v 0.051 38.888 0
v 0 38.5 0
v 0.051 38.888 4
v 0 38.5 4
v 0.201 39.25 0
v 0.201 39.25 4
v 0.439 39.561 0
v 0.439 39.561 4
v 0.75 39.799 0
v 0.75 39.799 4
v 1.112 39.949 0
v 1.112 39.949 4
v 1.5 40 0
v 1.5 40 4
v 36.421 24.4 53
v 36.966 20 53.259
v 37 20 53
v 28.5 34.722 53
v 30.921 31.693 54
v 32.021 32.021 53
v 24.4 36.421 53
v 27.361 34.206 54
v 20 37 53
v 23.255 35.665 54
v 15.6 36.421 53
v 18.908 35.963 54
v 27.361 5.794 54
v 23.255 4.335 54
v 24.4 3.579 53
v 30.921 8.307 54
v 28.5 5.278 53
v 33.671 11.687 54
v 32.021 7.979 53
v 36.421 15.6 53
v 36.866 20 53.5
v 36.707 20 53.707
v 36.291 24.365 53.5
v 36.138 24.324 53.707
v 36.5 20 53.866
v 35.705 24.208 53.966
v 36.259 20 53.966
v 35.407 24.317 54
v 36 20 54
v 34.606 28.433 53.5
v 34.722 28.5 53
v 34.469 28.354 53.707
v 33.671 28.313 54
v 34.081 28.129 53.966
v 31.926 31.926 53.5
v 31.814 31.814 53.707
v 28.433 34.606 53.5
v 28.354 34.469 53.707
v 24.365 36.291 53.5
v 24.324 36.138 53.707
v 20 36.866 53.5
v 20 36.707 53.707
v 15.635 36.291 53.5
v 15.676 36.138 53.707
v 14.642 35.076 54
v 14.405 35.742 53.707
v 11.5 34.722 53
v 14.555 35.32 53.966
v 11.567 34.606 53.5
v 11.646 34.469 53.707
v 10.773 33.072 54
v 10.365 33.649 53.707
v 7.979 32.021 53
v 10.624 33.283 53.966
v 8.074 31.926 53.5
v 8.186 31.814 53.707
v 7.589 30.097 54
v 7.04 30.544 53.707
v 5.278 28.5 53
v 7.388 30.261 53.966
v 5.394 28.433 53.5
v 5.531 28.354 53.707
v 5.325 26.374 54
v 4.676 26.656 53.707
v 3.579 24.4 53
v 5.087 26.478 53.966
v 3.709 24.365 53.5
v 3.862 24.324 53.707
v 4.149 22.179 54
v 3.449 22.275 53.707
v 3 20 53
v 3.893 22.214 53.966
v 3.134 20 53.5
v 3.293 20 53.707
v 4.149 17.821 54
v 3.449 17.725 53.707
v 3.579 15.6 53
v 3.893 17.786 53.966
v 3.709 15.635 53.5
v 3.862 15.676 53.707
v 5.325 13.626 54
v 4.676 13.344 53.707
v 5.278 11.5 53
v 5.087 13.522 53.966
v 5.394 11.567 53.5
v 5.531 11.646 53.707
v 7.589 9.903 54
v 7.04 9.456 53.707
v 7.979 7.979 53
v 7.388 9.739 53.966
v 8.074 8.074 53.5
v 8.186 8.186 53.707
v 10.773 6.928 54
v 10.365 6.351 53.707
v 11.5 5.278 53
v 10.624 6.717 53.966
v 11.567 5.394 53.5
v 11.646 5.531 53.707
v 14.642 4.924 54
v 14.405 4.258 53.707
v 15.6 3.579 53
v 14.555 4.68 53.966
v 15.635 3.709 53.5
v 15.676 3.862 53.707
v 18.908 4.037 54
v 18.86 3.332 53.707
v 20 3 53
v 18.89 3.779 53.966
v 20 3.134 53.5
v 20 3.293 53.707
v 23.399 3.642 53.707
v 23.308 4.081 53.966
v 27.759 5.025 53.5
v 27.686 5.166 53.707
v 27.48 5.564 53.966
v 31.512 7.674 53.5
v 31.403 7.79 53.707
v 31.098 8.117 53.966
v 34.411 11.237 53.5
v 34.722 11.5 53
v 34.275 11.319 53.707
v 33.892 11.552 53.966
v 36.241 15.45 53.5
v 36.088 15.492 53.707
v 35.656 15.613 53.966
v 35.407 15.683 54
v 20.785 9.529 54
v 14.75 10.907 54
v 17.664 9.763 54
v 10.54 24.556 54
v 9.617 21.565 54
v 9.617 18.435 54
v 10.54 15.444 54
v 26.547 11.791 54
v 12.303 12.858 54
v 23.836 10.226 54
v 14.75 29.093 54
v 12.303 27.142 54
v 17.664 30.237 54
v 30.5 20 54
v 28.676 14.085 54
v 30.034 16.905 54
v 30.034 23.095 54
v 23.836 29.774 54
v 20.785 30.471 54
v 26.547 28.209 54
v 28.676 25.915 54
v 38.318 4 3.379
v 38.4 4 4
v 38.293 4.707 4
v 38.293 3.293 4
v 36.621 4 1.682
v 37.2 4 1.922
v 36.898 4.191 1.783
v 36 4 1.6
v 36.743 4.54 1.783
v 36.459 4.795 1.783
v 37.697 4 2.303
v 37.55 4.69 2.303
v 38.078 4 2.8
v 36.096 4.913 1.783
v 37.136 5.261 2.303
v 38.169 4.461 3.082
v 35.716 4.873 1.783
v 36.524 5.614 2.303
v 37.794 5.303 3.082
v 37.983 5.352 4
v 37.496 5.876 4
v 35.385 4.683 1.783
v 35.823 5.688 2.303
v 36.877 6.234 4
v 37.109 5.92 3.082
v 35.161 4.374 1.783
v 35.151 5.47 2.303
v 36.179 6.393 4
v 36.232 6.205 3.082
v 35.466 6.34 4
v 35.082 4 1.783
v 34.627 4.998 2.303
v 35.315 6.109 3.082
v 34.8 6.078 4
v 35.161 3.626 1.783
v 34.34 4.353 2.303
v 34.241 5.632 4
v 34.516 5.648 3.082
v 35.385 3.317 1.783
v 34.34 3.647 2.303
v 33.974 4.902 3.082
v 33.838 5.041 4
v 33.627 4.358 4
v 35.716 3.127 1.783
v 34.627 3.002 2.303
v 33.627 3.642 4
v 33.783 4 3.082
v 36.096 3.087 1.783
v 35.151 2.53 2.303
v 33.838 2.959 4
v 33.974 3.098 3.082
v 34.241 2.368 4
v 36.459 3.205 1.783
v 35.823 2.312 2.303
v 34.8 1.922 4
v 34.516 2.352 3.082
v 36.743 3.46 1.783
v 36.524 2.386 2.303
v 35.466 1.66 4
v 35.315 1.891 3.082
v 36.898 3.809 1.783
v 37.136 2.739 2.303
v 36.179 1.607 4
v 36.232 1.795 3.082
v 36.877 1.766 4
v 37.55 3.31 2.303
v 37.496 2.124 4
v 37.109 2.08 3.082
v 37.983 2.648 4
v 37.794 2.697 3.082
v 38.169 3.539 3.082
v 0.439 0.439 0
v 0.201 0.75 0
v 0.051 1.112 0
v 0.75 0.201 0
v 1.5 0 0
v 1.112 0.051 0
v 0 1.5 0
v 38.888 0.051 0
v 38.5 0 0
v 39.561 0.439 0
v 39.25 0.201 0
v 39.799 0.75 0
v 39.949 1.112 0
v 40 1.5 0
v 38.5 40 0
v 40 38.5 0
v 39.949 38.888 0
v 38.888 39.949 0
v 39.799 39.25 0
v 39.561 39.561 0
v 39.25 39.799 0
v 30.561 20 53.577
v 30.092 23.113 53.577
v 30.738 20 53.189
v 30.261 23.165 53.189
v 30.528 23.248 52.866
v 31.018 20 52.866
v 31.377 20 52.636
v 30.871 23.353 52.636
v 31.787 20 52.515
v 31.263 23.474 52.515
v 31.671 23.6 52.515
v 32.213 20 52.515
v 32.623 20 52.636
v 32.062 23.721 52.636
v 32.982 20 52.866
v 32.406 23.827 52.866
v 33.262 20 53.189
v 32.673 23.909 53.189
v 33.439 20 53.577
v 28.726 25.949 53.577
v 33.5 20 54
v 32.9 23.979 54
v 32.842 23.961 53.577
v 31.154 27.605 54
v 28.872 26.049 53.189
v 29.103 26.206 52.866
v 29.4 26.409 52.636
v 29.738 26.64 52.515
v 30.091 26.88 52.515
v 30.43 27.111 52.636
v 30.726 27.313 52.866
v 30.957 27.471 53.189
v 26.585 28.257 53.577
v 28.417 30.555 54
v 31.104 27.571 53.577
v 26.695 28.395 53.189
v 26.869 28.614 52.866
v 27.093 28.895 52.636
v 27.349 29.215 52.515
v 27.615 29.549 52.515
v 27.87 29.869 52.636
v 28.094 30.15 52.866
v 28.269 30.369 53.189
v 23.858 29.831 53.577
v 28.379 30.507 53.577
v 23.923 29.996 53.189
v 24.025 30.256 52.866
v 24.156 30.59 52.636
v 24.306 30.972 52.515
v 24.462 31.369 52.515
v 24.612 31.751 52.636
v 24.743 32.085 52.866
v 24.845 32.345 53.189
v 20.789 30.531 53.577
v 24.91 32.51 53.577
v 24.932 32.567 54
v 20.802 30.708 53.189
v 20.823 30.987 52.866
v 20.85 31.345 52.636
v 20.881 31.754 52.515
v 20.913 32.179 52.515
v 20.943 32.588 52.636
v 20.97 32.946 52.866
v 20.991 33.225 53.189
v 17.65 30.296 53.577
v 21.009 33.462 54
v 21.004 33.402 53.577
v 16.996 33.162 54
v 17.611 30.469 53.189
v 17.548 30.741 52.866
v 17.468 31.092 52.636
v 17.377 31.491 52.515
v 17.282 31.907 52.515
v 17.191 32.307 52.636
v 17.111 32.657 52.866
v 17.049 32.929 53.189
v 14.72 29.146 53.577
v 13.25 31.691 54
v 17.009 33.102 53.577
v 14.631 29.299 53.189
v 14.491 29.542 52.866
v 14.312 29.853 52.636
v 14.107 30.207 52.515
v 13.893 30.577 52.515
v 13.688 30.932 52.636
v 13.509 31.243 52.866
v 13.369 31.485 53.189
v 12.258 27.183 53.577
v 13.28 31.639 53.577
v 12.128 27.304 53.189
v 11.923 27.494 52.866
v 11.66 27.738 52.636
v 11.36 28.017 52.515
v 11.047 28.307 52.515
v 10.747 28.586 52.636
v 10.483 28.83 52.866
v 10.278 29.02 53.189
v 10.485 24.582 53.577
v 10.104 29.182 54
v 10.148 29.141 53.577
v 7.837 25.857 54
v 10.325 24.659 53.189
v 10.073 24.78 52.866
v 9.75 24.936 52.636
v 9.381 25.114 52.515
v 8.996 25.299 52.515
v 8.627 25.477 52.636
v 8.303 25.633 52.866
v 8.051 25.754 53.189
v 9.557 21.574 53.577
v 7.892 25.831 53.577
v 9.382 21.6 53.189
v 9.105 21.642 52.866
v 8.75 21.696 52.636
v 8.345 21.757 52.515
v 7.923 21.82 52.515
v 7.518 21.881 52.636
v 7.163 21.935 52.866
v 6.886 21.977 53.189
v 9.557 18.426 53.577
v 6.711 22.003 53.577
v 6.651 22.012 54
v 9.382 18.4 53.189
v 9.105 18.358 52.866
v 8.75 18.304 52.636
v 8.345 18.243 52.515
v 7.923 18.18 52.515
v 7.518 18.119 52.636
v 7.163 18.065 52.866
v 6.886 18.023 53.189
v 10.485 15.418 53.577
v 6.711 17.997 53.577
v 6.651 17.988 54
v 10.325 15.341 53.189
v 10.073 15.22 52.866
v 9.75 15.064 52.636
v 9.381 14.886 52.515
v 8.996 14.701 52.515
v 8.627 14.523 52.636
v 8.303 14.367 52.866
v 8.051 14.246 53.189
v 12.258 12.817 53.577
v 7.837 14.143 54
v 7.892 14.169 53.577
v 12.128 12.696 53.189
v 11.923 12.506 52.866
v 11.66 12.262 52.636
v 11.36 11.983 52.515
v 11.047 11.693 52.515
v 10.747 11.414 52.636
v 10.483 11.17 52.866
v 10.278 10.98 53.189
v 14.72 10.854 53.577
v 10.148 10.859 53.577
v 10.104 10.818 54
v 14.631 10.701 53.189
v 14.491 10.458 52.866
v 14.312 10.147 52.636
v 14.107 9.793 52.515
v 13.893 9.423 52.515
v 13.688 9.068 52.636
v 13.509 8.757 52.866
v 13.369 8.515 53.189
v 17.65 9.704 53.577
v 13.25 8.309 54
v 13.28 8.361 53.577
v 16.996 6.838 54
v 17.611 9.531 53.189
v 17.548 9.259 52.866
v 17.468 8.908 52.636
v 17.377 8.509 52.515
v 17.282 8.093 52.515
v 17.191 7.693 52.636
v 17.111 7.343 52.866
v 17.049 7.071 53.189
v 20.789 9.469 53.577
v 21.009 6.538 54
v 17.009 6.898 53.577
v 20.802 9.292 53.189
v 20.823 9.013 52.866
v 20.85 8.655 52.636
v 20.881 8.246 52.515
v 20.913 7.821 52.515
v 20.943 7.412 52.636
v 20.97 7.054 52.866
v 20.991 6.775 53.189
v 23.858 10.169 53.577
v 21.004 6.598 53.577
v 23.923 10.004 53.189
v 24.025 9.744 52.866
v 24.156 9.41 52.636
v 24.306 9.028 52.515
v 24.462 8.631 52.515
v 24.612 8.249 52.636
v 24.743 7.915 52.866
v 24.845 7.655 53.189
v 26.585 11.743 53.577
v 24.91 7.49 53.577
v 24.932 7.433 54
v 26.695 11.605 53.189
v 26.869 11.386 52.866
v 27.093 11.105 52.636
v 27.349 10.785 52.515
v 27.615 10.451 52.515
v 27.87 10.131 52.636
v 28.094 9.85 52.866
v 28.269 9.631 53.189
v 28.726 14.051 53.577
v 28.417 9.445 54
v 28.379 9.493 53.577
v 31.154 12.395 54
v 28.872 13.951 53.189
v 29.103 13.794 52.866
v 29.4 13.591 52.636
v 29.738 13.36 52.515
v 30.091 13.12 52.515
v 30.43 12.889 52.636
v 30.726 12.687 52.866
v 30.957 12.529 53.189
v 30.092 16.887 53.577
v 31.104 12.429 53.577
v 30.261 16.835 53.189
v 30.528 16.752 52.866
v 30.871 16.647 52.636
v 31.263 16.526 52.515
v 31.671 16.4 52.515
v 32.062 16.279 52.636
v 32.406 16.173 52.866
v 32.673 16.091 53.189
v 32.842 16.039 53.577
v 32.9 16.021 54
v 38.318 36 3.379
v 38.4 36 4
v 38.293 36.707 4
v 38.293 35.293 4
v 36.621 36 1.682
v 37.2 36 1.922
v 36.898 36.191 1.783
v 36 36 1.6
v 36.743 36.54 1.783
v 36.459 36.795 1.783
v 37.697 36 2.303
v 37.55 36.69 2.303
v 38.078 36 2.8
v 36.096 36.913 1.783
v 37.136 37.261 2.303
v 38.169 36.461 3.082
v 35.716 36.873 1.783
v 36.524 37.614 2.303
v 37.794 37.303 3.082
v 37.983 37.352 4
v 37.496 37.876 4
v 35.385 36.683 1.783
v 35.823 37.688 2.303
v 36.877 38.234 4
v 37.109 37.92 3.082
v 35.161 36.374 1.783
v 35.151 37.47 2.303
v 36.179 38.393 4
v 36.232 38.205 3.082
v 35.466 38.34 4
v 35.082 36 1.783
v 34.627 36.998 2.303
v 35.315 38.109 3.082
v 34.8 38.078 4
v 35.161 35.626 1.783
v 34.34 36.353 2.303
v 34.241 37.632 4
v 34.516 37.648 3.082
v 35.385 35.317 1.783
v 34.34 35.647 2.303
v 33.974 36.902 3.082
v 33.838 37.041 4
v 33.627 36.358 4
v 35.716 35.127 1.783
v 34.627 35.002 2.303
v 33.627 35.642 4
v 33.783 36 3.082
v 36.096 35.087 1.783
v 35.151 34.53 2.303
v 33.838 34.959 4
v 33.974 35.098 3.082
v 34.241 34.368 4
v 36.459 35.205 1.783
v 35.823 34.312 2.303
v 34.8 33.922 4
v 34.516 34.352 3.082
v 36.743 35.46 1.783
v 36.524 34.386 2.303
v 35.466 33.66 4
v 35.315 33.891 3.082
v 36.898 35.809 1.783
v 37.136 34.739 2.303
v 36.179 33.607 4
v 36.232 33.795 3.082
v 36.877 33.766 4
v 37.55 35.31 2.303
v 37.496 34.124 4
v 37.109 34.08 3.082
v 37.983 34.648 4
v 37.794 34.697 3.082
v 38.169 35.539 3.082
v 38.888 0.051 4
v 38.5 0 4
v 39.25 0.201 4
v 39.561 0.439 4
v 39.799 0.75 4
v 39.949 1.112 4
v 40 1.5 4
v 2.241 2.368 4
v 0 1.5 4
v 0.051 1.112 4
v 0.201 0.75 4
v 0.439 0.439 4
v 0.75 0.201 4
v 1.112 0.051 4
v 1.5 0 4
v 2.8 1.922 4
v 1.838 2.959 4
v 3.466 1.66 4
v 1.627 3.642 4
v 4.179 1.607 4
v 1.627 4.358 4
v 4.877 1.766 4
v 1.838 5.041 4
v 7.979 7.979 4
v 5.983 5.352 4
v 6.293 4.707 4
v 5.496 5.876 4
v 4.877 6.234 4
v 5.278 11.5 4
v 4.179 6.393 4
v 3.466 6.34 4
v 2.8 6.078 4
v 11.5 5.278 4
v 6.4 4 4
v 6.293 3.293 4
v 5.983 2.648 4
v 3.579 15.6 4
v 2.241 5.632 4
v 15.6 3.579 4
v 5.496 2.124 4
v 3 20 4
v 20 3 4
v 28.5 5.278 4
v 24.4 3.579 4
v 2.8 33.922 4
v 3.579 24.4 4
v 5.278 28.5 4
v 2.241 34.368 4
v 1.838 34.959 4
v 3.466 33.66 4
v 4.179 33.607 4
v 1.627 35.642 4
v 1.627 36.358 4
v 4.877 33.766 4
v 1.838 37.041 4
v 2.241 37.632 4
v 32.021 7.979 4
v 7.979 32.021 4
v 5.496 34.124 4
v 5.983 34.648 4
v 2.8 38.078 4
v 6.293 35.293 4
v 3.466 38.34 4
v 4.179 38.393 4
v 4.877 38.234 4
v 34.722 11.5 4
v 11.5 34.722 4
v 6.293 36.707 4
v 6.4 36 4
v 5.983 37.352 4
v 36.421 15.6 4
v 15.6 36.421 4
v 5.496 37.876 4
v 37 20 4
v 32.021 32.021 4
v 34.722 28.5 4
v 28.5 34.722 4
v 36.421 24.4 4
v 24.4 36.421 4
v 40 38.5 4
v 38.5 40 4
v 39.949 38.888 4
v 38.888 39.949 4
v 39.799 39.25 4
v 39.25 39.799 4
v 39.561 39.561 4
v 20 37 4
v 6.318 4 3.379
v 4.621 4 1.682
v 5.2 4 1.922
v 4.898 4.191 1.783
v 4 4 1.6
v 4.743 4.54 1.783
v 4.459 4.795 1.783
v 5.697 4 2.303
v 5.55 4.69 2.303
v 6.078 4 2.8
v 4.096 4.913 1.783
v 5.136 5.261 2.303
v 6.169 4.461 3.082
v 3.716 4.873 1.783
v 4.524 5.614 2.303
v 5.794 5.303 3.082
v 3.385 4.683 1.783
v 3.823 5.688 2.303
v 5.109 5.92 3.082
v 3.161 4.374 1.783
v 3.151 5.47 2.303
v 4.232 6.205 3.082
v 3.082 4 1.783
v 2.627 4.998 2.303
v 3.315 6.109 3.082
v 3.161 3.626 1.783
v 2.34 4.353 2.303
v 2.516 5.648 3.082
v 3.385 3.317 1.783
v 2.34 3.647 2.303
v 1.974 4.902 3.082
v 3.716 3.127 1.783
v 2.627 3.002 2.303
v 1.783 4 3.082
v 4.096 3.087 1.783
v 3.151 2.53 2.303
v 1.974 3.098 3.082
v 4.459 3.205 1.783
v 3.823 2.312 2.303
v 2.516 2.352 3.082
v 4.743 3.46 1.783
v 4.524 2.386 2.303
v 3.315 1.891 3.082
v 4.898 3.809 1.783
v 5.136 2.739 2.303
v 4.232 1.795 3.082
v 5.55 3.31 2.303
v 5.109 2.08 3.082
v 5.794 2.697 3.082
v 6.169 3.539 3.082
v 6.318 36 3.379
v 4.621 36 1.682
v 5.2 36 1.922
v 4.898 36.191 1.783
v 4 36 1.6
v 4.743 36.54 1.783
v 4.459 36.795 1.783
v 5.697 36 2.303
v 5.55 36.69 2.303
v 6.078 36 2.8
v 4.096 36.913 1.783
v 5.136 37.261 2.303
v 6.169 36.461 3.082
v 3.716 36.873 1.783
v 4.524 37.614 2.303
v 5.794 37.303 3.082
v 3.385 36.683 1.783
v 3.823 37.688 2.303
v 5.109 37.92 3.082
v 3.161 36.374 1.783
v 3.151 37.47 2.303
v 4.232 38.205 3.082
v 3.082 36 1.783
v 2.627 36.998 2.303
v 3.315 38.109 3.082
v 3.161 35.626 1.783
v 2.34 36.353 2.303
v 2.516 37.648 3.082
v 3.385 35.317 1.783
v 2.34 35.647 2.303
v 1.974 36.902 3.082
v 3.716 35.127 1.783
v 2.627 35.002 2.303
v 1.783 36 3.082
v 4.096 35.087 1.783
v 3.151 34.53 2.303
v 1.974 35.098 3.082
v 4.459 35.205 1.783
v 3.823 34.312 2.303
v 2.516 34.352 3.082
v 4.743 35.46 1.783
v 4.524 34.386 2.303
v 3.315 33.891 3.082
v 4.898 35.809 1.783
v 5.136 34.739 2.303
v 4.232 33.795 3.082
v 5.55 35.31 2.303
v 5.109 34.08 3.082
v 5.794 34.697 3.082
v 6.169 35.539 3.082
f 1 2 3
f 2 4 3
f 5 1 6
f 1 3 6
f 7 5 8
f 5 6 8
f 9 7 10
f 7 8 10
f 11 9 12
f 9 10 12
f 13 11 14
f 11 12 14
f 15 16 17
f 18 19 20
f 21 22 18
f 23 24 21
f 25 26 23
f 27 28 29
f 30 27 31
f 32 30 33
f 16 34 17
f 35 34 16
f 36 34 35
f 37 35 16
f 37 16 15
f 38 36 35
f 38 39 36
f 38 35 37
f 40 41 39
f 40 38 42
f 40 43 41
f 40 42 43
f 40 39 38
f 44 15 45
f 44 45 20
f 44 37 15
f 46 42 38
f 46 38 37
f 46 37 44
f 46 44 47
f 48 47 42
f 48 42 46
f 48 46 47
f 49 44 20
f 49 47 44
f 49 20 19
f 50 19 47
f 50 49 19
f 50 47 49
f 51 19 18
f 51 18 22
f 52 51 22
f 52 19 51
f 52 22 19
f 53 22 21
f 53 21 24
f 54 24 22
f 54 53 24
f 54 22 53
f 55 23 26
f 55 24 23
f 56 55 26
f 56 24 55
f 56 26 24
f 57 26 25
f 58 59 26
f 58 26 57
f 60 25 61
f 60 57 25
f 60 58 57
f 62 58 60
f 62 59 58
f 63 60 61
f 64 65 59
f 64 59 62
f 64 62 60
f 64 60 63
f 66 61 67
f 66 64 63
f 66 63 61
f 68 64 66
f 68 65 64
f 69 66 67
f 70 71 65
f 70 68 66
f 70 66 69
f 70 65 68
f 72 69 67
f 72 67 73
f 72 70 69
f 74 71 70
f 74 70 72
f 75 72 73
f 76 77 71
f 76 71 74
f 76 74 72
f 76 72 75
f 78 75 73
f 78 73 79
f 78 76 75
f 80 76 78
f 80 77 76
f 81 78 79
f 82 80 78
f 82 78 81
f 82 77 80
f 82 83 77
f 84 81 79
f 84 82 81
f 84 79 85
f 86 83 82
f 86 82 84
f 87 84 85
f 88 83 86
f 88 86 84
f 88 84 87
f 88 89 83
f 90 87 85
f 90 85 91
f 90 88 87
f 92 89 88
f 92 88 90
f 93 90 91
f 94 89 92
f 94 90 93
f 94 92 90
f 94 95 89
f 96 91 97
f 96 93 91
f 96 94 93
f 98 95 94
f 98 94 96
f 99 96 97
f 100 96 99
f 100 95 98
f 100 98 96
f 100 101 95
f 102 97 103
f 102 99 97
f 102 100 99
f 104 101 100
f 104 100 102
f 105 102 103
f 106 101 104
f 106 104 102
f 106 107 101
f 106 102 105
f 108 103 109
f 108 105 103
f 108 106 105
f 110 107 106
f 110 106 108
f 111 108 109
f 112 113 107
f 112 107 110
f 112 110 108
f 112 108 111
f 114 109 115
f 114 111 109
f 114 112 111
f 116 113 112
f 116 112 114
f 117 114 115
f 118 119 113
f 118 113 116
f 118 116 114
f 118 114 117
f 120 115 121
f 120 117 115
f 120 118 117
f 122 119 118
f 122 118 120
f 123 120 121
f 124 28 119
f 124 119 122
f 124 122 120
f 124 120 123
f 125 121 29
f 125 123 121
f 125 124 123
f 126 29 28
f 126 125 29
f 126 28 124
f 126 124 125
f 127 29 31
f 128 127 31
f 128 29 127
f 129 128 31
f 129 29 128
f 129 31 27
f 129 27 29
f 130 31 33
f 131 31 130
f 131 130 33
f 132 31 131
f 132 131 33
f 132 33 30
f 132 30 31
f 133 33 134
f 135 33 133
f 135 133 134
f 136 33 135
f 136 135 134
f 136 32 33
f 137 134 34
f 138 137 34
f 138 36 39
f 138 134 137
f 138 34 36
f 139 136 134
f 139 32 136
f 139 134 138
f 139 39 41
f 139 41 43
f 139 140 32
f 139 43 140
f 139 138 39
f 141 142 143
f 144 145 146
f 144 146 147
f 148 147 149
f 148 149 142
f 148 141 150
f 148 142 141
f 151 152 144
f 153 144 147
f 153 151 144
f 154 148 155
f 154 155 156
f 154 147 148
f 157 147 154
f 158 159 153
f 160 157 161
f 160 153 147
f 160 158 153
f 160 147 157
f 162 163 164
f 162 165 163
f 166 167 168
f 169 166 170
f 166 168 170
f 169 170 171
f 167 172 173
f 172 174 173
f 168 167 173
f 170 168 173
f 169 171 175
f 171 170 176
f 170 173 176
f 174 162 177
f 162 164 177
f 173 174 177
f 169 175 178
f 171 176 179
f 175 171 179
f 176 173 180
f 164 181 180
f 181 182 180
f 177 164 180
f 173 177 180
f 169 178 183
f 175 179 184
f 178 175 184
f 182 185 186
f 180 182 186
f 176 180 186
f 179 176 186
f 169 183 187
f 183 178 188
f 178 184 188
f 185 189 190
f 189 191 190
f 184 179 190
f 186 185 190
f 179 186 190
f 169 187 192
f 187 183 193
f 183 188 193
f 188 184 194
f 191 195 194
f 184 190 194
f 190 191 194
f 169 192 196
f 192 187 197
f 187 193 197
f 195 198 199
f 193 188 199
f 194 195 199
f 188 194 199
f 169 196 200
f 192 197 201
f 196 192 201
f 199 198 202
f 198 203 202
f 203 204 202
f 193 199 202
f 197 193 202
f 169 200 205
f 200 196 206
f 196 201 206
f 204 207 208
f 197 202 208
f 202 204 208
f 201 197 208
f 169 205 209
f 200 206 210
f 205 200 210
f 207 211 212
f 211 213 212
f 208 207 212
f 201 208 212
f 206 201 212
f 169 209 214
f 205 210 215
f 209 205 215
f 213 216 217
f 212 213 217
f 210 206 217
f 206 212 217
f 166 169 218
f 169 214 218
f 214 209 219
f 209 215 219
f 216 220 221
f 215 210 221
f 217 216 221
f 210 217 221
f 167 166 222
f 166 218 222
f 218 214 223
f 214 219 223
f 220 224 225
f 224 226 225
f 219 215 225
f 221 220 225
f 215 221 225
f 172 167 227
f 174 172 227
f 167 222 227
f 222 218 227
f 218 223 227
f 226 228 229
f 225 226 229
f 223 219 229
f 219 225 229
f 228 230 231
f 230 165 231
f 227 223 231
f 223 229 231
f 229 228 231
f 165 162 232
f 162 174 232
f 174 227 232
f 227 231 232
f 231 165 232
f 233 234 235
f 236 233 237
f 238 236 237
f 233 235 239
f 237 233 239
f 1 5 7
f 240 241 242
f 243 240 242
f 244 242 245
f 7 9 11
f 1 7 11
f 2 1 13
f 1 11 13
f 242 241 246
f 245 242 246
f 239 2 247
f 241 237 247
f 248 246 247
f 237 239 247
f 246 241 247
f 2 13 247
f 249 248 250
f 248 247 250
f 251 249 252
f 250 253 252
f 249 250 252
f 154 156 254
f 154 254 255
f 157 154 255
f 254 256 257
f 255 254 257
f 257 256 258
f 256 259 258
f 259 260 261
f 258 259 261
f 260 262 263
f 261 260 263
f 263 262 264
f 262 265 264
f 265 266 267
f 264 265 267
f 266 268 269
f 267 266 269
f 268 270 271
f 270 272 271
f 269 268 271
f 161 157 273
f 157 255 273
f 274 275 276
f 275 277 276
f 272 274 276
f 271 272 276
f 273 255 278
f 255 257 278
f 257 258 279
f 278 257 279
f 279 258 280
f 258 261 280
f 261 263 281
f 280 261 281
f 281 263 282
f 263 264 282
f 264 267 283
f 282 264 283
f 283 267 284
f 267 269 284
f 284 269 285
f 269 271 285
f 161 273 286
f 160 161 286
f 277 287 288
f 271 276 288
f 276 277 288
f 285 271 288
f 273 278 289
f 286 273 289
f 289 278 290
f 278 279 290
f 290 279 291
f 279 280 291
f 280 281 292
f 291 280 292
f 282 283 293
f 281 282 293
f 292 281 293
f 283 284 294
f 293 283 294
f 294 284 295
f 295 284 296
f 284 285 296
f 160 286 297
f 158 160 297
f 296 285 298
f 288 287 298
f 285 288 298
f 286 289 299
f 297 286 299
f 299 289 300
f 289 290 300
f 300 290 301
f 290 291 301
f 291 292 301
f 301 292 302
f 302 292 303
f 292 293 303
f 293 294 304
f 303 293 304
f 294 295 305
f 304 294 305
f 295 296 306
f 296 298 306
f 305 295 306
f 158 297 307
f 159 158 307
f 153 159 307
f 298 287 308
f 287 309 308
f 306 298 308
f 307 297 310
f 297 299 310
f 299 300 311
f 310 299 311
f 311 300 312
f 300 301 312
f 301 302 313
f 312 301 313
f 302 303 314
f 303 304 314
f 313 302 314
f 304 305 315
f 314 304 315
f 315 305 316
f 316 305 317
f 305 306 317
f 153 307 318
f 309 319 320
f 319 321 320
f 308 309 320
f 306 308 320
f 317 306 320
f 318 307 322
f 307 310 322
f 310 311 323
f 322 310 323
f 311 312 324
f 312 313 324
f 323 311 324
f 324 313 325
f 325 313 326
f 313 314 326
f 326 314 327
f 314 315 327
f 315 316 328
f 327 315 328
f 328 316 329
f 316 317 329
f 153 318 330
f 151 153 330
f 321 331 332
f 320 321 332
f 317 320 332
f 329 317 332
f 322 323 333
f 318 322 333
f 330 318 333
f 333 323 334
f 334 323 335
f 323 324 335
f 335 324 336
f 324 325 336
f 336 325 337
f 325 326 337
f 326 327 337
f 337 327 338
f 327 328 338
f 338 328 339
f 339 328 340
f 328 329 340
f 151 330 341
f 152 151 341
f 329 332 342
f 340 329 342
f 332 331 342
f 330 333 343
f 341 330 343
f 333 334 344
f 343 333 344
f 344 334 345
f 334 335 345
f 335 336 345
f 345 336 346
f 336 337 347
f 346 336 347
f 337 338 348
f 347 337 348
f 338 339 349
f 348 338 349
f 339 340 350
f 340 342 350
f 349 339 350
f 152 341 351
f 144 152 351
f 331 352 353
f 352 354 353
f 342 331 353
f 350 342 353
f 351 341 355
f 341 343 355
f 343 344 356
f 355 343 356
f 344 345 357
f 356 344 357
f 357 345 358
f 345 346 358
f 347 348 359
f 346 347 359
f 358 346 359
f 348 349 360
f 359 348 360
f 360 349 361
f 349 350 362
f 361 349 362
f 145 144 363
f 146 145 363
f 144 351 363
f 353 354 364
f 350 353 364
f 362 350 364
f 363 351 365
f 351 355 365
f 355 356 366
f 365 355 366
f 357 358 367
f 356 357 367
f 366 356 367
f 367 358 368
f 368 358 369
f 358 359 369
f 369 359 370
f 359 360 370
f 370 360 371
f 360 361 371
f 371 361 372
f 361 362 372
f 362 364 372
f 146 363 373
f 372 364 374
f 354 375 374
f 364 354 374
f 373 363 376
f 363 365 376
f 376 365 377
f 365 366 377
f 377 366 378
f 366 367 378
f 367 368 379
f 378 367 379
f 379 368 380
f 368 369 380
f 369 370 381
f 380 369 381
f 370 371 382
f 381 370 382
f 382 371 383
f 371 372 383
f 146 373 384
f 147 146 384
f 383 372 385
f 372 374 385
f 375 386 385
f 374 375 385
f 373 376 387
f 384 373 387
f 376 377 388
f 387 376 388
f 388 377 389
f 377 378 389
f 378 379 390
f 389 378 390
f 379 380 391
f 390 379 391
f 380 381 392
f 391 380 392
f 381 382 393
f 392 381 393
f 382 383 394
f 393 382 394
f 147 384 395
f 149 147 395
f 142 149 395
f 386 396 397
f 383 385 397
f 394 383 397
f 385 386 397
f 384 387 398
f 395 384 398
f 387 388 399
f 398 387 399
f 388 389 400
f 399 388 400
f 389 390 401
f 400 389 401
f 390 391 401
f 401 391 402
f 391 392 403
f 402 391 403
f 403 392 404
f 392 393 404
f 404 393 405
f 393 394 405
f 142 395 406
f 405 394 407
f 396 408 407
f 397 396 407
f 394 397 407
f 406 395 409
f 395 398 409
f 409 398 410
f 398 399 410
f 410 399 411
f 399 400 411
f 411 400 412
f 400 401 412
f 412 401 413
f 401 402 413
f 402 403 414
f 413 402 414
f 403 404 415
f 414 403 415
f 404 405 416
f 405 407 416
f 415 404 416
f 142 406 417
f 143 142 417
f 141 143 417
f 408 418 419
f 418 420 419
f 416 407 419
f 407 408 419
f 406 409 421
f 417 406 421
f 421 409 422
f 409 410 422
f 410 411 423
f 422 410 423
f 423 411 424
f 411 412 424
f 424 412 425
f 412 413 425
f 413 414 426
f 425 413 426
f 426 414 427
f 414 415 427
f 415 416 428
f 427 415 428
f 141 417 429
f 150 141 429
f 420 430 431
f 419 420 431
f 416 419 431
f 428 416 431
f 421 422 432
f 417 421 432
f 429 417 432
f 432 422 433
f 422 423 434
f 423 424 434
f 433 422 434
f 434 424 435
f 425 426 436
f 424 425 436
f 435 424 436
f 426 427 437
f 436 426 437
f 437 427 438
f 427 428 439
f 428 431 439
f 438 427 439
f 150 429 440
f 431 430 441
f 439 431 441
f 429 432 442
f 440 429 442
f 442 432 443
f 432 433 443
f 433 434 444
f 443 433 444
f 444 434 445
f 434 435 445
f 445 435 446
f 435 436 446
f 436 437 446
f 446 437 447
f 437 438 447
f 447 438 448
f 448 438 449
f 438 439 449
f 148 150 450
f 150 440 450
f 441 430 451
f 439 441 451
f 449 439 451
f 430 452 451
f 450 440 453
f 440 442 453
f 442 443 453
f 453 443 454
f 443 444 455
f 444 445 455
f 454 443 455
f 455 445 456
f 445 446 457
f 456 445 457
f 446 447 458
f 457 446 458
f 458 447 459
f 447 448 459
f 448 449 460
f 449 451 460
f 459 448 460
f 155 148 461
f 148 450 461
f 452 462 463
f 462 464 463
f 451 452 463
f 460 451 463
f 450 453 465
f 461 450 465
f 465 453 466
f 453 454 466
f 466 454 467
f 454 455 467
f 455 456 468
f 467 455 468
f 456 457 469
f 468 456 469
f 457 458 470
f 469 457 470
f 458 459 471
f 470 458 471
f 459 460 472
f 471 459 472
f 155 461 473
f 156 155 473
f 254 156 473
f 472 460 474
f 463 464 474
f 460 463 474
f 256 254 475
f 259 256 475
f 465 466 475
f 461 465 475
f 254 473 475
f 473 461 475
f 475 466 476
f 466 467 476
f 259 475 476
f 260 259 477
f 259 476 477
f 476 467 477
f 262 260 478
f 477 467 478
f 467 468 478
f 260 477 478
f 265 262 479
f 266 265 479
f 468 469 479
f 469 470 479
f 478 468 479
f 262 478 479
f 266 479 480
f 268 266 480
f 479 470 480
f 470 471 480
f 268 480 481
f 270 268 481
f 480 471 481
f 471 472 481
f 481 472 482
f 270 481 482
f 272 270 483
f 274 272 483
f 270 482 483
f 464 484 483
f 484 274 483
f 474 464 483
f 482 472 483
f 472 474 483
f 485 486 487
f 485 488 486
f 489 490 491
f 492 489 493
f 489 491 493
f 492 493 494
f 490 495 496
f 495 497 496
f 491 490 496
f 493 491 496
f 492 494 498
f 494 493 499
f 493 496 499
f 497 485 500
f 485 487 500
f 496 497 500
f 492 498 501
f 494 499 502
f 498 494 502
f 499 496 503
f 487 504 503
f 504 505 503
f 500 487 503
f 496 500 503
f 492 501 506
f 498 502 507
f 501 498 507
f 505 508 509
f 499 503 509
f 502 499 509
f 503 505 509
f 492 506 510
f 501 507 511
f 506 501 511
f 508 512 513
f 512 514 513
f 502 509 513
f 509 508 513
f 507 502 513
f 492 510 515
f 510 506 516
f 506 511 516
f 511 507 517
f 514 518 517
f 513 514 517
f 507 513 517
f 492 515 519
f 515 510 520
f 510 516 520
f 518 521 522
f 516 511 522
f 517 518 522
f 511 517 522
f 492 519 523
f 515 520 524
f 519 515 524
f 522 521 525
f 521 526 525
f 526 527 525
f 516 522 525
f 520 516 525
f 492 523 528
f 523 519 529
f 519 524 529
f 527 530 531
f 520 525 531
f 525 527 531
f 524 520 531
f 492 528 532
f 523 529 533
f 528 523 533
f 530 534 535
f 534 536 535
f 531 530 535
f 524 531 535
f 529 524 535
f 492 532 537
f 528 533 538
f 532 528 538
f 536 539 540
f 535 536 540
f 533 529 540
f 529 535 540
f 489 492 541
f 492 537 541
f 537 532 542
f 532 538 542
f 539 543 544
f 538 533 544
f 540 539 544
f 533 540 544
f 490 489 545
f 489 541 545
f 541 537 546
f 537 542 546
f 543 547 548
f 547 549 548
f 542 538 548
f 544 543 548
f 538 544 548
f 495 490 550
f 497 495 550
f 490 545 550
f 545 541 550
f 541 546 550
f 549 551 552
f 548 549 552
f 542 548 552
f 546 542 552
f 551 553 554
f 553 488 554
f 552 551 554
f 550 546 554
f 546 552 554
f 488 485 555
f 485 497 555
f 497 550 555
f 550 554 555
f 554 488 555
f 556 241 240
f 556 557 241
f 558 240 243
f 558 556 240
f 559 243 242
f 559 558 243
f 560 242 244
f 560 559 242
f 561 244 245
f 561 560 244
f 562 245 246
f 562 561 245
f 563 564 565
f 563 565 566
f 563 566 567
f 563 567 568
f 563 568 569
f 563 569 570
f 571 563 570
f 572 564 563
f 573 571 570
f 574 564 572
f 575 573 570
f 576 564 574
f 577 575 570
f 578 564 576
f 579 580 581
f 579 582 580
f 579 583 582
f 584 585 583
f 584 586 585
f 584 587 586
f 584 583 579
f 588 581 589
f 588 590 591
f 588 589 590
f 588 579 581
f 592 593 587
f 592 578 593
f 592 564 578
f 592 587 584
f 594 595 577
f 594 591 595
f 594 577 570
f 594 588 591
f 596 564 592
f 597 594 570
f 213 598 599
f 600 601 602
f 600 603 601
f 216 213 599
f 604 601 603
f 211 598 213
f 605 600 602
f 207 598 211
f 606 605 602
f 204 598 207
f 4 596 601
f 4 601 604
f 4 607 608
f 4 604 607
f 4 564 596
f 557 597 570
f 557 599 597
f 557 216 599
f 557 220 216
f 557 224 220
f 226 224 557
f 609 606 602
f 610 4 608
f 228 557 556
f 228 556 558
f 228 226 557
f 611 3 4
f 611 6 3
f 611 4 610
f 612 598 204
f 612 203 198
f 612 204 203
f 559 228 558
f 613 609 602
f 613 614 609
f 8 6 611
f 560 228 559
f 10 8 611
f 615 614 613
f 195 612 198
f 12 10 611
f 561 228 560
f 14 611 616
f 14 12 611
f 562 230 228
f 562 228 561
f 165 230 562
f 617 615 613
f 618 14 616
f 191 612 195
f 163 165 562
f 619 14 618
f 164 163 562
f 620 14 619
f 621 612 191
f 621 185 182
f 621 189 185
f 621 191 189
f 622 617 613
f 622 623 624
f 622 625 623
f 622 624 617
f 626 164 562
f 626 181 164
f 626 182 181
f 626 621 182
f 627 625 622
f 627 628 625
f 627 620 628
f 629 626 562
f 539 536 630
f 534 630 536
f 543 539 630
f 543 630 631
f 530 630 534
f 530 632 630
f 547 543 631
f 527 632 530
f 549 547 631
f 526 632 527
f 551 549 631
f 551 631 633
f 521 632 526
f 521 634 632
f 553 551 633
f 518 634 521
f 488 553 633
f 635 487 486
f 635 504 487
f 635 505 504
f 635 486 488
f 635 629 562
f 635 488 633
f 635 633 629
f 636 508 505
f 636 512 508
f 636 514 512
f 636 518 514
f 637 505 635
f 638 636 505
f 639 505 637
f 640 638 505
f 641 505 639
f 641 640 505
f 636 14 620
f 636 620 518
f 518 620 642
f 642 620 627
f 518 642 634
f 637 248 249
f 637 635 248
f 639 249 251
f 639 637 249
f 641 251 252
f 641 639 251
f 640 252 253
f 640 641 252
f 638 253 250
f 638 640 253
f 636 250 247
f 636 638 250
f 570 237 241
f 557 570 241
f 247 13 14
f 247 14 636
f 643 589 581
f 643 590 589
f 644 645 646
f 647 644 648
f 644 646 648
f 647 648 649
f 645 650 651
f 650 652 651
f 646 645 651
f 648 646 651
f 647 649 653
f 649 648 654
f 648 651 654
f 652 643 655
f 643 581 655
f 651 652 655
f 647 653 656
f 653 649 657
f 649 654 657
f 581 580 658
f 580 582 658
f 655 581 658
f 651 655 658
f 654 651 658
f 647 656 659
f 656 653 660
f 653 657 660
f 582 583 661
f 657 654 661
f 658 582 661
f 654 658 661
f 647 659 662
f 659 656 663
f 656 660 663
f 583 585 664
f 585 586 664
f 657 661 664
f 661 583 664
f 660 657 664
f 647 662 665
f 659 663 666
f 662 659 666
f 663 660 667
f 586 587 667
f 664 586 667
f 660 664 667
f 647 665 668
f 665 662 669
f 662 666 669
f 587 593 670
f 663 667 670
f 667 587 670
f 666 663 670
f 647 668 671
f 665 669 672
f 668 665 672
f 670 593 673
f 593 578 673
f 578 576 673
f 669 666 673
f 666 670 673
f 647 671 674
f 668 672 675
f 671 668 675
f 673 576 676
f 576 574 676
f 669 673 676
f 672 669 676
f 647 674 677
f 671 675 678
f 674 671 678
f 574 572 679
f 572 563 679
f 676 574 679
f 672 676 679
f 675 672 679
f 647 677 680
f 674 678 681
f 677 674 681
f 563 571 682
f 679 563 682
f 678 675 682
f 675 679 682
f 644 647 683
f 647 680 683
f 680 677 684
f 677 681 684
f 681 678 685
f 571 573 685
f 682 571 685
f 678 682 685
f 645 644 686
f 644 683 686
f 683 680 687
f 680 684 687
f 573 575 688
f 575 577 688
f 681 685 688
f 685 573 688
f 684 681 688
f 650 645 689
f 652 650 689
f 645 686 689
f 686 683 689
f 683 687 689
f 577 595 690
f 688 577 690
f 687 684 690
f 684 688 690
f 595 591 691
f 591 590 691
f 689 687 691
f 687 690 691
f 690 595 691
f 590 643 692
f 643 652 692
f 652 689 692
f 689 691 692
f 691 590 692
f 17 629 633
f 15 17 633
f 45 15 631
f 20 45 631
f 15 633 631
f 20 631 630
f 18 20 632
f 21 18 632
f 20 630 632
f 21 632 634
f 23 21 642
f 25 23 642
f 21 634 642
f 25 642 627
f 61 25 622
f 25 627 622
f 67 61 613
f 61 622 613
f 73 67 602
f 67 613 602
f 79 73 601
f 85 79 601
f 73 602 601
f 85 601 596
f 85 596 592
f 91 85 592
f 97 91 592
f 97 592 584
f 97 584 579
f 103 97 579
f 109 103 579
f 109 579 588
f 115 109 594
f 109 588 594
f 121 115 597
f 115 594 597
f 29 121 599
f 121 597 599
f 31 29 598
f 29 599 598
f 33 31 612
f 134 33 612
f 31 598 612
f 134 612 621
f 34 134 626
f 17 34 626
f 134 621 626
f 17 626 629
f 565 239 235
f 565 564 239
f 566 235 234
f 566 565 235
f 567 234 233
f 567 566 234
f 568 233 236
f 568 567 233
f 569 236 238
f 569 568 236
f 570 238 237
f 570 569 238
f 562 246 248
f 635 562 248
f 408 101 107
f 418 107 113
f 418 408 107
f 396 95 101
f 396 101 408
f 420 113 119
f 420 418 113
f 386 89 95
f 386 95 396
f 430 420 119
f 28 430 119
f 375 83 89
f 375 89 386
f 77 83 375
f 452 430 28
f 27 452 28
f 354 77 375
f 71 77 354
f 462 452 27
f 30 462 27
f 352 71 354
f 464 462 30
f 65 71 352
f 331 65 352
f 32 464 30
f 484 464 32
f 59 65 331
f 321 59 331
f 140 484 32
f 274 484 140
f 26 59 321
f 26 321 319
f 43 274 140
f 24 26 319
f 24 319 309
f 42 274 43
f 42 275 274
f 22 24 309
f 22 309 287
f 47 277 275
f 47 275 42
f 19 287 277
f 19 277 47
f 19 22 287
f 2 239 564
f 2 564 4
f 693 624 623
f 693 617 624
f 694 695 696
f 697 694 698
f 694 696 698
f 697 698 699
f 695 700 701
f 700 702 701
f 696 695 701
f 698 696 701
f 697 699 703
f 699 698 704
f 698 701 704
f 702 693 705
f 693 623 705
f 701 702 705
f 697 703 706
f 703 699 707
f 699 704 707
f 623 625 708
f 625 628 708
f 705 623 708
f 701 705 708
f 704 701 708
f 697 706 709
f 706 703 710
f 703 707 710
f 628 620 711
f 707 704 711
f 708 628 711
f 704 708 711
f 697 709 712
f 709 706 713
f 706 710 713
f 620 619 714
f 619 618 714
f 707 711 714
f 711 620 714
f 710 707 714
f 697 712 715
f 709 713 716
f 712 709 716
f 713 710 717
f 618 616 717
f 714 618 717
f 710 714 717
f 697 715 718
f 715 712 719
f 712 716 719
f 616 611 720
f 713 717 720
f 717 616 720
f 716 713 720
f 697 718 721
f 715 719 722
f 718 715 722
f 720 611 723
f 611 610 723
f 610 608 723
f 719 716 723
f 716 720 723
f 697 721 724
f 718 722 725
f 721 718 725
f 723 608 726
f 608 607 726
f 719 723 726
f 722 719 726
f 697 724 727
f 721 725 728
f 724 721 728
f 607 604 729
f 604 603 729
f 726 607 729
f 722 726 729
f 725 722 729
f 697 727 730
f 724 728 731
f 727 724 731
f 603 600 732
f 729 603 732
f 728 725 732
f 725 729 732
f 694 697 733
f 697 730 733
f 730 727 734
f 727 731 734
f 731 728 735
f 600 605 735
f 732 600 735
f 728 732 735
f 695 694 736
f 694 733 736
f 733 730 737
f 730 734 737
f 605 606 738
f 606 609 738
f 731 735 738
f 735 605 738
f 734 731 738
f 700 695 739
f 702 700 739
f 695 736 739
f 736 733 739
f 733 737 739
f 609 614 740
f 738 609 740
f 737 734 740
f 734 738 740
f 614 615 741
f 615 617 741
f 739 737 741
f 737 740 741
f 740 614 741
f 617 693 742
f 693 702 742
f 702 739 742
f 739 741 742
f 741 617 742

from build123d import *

# Parameters (mm, degrees)
TORUS_R        = 1.5
CYLINDER_R     = 17
CYLINDER_DEPTH = 50
FILLET001_R    = 1
ARRAY_X_COUNT  = 2
ARRAY_X_PITCH  = 32
ARRAY_Y_COUNT  = 2
ARRAY_Y_PITCH  = 32
BOX_W          = 40
BOX_H          = 40
BOX_DEPTH      = 4
FILLET_R       = 1.5


with BuildPart() as part_cilindre:
    # Torus → Torus (revolve)
    with BuildSketch(Plane(origin=(0, 0, 50), x_dir=(1, 0, 0), z_dir=(0, -1, 0))):
        with Locations((12, 0)):
            Circle(TORUS_R)
    revolve(axis=Axis((0, 0, 50), (0, 0, 1)))


with BuildPart() as cilindre_acabat:
    # Cylinder → Cylinder (new body)
    with BuildSketch(Plane.XY):
        Circle(CYLINDER_R)
    extrude(amount=CYLINDER_DEPTH)

    # Fillet001
    fillet001_edges = [cilindre_acabat.edges().sort_by_distance(p)[0] for p in [
        (-17, 0, 50),
    ]]
    fillet(fillet001_edges, radius=FILLET001_R)

    # Cut001: cut part_cilindre
    add(part_cilindre.part, mode=Mode.SUBTRACT)


with BuildPart() as cilindre_acabat_1:
    # Cut001 placement: moved
    add(cilindre_acabat.part.moved(Location((20, 20, 4))))


with BuildPart() as array:
    # Sphere → Sphere (revolve)
    with BuildSketch(Plane(origin=(4, 4, 4), x_dir=(1, 0, 0), z_dir=(0, -1, 0))):
        with BuildLine():
            ThreePointArc((0, -2.4), (2.4, 0), (0, 2.4))
            Line((0, 2.4), (0, -2.4))
        make_face()
    revolve(axis=Axis((4, 4, 4), (0, 0, 1)))

    # Array X: Array ×2


with BuildPart() as array_1:
    add(array.part)
    with Locations(*[(i * ARRAY_X_PITCH, 0, 0) for i in range(1, ARRAY_X_COUNT)]):
        add(array.part)

    # Array Y: Array ×2


with BuildPart() as array_2:
    add(array_1.part)
    with Locations(*[(0, i * ARRAY_Y_PITCH, 0) for i in range(1, ARRAY_Y_COUNT)]):
        add(array_1.part)


with BuildPart() as objecte:
    # Box → Box (new body)
    with BuildSketch(Plane.XY):
        with Locations((20, 20)):
            Rectangle(BOX_W, BOX_H)
    extrude(amount=BOX_DEPTH)

    # Fillet
    fillet_edges = [objecte.edges().sort_by_distance(p)[0] for p in [
        (0, 0, 2),
        (0, 40, 2),
        (40, 0, 2),
        (40, 40, 2),
    ]]
    fillet(fillet_edges, radius=FILLET_R)

    # Cut: cut Array
    add(array_2.part, mode=Mode.SUBTRACT)

    # Fusion: union cilindre_acabat
    add(cilindre_acabat_1.part)


solid = objecte.part
